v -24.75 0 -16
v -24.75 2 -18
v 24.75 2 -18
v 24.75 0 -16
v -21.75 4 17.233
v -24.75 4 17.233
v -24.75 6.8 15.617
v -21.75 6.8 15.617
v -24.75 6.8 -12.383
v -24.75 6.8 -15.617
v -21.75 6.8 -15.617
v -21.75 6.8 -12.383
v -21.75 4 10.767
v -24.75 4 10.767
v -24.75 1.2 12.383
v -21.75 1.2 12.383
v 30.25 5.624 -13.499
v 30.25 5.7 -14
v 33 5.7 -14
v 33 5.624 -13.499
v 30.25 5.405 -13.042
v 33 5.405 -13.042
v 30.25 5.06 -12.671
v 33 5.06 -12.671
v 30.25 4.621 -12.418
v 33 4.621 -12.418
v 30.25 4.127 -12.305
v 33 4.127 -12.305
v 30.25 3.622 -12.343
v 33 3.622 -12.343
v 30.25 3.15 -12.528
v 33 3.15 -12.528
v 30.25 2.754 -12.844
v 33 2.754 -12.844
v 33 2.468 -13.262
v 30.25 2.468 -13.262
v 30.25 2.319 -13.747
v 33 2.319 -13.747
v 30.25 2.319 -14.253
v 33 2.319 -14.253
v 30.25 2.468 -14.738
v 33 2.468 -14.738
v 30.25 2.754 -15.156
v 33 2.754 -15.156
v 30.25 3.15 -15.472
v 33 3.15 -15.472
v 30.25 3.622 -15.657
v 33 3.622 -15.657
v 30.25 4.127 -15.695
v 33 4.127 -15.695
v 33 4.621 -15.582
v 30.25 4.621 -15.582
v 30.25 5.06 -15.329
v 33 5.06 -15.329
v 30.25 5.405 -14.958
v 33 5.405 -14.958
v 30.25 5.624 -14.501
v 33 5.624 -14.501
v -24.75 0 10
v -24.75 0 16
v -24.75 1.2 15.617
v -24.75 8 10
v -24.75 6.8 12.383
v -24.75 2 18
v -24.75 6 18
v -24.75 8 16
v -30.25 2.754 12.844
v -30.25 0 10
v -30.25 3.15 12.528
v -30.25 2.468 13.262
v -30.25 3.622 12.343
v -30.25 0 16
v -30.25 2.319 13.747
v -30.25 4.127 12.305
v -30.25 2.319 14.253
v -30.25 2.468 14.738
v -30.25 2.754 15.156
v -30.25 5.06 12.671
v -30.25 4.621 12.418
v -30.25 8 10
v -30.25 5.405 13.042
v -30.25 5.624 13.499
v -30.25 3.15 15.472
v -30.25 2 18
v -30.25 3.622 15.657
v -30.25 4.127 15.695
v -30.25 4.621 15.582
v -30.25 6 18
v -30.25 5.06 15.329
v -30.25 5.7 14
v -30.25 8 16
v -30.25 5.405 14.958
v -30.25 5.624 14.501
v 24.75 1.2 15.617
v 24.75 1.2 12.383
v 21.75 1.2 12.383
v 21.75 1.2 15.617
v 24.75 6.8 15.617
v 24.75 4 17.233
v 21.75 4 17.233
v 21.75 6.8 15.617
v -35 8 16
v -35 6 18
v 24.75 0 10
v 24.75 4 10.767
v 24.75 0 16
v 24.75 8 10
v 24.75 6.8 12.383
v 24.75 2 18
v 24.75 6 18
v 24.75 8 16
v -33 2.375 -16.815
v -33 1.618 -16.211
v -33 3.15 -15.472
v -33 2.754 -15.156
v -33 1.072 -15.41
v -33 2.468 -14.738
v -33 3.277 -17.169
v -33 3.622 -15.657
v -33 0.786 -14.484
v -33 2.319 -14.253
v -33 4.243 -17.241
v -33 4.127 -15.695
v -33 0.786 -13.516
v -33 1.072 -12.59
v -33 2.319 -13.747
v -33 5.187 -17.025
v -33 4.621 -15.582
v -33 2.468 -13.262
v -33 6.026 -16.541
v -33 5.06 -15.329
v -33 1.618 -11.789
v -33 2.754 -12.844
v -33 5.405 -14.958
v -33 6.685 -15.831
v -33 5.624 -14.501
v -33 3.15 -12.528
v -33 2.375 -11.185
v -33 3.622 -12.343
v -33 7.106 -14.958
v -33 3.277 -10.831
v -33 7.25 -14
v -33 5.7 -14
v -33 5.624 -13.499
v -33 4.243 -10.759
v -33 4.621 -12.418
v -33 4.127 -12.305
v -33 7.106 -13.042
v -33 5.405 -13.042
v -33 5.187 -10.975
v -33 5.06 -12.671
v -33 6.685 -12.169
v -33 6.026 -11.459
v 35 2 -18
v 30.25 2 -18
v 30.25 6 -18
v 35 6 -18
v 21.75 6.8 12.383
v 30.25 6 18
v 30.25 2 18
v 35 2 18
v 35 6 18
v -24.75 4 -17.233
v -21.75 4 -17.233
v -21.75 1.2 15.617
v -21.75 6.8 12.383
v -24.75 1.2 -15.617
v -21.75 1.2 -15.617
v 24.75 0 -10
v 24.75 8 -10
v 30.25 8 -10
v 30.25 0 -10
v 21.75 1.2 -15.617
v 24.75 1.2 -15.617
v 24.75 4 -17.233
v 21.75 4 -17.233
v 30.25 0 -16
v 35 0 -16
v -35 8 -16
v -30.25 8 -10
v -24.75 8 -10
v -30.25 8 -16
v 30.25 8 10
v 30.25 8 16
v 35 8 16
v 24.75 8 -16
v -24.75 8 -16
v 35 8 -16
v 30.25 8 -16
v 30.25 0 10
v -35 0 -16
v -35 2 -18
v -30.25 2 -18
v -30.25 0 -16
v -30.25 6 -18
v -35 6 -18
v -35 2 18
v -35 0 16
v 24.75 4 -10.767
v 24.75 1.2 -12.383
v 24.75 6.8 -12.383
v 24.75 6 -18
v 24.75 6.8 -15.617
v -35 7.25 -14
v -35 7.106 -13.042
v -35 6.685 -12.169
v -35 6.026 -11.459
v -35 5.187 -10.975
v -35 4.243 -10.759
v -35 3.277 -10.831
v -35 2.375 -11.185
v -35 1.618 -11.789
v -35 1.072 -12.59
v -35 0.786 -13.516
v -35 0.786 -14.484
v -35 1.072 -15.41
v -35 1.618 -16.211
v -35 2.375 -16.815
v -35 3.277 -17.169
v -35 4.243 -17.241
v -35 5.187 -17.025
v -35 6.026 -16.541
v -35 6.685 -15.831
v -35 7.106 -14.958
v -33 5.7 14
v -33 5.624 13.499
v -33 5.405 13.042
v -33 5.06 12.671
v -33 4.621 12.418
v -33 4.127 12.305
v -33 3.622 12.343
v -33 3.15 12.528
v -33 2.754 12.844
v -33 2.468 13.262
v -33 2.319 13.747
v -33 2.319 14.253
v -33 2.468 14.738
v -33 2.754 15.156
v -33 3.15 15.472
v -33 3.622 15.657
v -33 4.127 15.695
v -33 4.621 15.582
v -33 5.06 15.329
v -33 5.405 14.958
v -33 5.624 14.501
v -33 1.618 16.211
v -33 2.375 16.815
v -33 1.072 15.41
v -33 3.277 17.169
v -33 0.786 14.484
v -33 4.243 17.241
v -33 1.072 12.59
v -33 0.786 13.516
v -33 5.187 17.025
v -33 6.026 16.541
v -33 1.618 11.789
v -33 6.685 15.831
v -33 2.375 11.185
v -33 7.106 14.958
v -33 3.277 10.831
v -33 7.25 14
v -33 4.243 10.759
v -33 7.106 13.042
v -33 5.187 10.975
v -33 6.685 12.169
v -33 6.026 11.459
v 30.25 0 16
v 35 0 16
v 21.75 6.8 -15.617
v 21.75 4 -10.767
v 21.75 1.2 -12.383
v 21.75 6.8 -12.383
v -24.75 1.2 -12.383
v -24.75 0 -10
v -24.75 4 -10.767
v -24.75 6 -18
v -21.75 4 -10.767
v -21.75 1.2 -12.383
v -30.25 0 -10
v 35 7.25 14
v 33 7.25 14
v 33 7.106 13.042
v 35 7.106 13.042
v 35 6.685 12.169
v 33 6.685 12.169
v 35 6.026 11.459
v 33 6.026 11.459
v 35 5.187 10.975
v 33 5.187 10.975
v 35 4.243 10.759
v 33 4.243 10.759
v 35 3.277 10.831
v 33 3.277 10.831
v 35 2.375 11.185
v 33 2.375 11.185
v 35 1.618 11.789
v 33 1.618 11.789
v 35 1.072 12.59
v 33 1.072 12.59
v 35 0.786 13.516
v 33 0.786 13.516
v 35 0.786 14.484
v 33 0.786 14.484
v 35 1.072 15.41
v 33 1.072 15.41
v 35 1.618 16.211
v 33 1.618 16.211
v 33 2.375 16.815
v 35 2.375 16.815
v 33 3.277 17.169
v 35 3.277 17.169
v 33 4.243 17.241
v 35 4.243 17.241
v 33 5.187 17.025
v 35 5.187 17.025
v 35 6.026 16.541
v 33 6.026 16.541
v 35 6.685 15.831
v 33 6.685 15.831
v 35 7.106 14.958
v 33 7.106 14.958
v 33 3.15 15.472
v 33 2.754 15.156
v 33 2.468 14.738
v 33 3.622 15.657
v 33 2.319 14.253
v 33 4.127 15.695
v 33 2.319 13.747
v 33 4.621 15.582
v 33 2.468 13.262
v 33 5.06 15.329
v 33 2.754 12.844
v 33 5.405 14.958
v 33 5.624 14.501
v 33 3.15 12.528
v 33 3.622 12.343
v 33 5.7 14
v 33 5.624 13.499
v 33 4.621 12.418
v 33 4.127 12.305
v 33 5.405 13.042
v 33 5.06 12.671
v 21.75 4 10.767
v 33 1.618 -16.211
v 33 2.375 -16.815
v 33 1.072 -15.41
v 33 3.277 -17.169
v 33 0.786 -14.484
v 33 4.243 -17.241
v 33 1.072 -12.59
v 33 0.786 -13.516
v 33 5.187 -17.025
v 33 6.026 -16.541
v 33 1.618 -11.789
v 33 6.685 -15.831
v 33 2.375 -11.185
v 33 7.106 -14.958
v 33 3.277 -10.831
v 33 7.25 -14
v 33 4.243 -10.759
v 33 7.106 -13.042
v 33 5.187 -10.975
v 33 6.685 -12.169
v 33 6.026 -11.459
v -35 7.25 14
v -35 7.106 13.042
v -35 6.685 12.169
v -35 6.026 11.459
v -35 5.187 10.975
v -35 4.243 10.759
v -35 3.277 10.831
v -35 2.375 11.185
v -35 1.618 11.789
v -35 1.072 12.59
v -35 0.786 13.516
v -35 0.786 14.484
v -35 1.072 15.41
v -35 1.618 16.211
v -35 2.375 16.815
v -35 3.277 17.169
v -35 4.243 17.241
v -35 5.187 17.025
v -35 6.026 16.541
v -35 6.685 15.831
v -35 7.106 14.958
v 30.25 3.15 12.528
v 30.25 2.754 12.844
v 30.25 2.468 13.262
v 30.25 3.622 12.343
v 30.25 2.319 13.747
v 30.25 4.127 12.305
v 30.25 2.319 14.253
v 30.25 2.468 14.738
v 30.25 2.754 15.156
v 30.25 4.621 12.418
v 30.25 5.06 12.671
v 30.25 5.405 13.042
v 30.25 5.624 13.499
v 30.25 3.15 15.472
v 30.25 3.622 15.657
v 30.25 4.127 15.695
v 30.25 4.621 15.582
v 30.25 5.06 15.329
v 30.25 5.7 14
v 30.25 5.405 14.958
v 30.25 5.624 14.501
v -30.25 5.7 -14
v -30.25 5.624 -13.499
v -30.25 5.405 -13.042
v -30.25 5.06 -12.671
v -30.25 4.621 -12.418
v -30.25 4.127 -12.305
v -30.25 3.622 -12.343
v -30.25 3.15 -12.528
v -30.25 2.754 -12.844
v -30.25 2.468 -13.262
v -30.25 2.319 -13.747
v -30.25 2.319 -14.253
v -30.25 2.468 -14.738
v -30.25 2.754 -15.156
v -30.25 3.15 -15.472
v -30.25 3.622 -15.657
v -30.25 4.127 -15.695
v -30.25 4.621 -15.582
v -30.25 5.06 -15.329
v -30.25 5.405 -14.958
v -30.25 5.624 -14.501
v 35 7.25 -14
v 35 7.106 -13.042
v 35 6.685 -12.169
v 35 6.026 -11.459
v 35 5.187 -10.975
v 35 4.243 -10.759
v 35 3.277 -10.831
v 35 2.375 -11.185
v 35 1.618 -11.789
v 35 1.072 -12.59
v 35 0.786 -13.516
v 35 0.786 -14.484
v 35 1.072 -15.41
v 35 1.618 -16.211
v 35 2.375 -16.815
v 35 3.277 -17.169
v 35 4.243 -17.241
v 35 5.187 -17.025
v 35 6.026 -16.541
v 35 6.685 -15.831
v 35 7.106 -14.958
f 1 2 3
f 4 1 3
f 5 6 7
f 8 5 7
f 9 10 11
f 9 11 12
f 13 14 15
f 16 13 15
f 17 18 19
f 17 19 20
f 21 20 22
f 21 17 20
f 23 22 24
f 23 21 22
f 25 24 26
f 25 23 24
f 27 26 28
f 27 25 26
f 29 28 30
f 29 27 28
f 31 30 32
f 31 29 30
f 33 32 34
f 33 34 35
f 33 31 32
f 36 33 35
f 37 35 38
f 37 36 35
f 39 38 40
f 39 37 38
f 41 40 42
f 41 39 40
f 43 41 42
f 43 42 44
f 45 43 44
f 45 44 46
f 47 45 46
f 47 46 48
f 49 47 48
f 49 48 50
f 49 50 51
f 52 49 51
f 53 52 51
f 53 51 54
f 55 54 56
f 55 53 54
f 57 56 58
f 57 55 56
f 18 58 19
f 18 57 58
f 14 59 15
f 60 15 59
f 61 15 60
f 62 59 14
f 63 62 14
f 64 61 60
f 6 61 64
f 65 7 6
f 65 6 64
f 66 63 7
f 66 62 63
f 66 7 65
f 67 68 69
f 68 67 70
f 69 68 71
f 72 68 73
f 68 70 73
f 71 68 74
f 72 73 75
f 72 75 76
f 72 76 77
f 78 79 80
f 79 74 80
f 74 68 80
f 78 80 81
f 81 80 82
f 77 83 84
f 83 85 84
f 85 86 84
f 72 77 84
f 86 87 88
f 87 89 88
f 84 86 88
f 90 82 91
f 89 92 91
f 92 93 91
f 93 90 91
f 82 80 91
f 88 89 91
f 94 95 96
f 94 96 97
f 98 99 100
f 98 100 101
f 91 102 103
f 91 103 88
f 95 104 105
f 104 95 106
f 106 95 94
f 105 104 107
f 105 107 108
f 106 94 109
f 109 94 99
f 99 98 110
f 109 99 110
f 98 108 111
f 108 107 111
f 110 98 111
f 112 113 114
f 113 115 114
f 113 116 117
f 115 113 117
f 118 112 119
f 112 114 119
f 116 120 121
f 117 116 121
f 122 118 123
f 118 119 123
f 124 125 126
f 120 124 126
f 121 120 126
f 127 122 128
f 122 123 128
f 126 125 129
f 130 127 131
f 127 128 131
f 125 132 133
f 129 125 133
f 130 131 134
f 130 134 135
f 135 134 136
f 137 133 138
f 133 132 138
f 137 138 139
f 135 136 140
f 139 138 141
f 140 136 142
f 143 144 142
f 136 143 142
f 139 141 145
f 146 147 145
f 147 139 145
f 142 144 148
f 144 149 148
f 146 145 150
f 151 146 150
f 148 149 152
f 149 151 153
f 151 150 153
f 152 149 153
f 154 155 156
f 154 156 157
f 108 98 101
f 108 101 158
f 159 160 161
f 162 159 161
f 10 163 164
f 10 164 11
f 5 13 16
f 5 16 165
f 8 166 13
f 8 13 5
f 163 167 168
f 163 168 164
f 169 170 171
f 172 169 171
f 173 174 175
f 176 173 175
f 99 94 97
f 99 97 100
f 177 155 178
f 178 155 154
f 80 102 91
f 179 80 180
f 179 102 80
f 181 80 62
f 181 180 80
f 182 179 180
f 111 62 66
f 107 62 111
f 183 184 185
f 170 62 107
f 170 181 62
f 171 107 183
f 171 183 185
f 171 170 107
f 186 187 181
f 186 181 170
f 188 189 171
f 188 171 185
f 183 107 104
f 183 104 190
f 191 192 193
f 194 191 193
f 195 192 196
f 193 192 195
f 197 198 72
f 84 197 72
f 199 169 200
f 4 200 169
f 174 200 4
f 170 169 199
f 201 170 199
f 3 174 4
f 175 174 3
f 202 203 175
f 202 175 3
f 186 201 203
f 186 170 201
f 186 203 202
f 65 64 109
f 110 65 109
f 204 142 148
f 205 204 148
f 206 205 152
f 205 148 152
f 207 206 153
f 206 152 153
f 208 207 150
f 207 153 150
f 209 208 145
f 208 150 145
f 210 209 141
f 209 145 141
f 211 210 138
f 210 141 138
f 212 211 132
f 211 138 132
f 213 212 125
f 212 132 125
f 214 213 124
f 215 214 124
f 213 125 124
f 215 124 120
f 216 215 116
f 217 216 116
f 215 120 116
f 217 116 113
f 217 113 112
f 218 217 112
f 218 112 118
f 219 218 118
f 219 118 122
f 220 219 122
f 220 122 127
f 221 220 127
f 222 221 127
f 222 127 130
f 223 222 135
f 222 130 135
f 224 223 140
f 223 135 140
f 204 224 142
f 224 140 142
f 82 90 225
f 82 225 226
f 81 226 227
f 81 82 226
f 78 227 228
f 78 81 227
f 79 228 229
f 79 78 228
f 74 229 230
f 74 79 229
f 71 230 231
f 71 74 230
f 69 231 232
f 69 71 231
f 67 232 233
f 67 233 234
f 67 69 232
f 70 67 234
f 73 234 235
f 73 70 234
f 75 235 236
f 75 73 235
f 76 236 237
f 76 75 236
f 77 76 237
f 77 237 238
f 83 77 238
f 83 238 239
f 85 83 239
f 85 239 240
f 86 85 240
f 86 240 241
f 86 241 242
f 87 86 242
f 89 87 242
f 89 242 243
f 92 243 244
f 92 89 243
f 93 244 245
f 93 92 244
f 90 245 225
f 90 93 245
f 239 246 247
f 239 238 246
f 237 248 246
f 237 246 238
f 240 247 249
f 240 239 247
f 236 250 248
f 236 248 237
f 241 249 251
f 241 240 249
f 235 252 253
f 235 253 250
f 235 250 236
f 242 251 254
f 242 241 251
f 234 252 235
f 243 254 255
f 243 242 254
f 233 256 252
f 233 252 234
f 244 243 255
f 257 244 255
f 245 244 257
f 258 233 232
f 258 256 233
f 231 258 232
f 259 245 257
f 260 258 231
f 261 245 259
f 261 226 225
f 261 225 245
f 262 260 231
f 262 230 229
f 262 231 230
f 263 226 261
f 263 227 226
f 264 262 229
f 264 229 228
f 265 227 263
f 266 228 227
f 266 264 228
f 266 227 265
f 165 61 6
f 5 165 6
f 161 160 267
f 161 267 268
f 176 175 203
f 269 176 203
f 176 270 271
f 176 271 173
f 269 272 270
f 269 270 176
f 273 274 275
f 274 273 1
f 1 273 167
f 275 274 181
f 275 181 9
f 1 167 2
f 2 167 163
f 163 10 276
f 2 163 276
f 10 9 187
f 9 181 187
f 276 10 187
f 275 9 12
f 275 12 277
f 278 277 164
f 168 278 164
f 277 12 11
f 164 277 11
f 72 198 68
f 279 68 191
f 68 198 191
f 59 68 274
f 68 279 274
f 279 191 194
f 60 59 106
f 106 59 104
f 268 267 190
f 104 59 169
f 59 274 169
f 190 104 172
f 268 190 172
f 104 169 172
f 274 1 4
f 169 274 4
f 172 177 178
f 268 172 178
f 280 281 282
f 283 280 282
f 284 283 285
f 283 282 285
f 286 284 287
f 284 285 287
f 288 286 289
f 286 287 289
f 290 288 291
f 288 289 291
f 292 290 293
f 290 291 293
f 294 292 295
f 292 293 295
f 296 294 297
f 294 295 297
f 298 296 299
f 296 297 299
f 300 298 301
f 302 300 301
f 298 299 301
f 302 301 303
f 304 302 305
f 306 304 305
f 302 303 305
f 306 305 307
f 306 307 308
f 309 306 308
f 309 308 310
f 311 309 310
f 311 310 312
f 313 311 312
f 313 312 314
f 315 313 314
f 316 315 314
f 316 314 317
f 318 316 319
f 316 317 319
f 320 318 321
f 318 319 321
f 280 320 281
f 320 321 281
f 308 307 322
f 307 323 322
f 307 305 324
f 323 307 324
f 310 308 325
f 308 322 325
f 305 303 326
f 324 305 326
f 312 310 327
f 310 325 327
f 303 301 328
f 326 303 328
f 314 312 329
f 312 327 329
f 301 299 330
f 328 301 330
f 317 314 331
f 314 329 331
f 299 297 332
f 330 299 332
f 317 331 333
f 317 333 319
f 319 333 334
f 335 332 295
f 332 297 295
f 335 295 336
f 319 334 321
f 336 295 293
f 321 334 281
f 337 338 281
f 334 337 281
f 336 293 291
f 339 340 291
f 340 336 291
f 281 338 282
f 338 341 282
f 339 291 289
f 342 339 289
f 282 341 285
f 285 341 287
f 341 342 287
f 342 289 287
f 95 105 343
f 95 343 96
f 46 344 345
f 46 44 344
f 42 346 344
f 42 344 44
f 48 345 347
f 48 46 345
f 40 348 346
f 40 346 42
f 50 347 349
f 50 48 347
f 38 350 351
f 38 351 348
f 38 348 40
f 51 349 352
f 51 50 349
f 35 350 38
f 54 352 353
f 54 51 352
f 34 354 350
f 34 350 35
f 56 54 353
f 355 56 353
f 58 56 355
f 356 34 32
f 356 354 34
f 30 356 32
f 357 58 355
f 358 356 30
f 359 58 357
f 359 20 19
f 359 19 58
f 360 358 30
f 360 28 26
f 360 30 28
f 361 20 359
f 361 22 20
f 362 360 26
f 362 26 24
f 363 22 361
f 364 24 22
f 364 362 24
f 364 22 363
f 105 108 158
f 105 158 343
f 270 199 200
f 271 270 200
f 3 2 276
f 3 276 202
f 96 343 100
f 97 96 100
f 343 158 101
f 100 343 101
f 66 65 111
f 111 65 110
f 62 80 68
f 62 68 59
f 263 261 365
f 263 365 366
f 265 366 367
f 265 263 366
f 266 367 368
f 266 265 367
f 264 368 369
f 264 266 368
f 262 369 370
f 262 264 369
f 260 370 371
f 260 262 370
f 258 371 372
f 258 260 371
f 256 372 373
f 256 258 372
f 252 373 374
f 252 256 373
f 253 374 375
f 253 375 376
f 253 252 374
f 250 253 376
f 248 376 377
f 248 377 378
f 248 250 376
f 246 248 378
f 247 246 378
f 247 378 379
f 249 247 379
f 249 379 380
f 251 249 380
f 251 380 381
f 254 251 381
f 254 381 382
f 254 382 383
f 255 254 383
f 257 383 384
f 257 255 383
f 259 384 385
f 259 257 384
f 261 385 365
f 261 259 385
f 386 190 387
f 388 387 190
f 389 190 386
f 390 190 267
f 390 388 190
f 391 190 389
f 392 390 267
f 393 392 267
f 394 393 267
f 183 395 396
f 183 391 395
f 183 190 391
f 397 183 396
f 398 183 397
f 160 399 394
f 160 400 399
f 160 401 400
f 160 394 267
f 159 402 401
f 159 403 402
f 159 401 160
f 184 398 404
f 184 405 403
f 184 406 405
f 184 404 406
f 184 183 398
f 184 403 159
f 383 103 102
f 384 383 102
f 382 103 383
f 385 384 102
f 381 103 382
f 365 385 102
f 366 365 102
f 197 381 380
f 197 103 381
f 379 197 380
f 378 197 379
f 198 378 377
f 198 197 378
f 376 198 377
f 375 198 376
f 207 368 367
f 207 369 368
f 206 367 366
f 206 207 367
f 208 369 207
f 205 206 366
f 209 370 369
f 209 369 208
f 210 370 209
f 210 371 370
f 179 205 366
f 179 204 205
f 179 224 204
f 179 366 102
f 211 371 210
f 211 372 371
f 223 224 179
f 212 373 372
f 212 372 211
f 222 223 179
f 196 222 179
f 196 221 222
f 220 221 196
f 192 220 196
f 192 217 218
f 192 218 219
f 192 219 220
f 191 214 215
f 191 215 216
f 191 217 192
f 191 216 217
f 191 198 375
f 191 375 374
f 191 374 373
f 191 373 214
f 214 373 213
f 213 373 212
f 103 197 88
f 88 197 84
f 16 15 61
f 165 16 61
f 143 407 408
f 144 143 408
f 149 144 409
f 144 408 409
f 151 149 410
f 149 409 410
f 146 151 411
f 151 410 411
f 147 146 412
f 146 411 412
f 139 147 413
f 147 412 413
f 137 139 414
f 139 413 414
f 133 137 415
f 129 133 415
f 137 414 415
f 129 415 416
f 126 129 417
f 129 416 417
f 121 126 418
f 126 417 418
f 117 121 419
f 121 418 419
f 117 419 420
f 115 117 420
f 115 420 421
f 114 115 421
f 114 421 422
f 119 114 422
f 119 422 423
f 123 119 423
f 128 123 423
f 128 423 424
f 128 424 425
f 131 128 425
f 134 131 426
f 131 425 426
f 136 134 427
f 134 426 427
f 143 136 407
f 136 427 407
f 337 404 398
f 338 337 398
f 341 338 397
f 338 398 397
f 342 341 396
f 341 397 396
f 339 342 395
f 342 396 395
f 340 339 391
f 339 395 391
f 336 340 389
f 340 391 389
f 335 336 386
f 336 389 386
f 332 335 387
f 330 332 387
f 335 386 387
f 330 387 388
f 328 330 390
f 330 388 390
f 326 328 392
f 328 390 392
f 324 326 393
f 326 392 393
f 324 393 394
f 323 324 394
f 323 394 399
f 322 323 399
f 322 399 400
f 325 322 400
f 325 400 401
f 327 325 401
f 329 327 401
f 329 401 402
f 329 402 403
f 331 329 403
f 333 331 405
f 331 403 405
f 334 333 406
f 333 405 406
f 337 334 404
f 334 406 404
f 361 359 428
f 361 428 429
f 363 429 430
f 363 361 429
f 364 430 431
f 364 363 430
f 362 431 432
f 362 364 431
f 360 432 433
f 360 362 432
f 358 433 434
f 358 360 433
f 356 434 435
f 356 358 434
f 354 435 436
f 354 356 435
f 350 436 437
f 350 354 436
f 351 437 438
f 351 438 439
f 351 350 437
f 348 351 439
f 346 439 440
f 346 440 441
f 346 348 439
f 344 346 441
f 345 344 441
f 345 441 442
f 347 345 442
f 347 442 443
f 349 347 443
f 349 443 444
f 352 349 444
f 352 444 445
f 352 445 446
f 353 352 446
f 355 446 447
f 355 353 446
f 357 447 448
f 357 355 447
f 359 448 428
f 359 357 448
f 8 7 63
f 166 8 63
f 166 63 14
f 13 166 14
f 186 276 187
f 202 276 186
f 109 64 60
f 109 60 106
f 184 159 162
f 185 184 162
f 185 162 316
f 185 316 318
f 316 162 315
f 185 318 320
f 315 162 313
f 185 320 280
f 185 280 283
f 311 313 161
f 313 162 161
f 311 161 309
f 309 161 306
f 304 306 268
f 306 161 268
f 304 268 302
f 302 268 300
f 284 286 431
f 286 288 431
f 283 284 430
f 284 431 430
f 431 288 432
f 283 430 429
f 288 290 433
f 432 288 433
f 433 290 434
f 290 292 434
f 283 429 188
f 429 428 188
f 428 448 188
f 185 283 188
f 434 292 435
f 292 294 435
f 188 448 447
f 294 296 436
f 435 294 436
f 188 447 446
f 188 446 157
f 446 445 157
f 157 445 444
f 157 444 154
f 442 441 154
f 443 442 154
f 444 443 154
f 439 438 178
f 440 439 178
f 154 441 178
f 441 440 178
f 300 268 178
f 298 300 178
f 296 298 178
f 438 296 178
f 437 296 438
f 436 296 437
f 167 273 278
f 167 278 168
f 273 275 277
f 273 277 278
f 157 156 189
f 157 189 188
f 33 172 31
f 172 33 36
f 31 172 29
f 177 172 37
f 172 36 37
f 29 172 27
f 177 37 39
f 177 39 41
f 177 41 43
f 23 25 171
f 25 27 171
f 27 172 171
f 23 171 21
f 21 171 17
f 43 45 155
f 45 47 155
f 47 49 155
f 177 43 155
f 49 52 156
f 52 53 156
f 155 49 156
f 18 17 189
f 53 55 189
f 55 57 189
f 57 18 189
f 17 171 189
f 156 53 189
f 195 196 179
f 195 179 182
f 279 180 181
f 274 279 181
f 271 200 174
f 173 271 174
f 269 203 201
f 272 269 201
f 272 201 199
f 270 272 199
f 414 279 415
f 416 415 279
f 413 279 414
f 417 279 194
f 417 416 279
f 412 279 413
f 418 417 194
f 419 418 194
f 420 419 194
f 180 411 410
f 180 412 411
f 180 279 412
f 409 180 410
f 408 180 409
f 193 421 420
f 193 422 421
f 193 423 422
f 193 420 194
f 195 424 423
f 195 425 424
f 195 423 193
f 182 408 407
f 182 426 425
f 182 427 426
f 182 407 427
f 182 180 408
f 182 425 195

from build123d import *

# Parameters (mm, degrees)
SKETCH1_W                                  = 70
SKETCH1_H                                  = 36
BOSS_EXTRUDE1_DEPTH                        = 8
SKETCH2_W                                  = 5.5
SKETCH2_H                                  = 8
CUT_EXTRUDE1_DEPTH                         = 41.162171256
CBORE_START                                = 33
CBORE_FOR_M3_CHEESE_HEAD_SCREW1_OUTLINE_R  = 3.25
CBORE_FOR_M3_CHEESE_HEAD_SCREW1_DEPTH      = 2
CBORE_START_2                              = 30.25
CBORE_FOR_M3_CHEESE_HEAD_SCREW1_2_OUTLIN_R = 1.7
CBORE_FOR_M3_CHEESE_HEAD_SCREW1_2_DEPTH    = 2.75
CUT_EXTRUDE2_DEPTH                         = 3
MIRROR2_START                              = 33
MIRROR2_COPY_1_SKETCH_R                    = 3.25
MIRROR2_COPY_1_DEPTH                       = 2
MIRROR2_START_2                            = 30.25
MIRROR2_COPY_2_SKETCH_R                    = 1.7
MIRROR2_COPY_2_DEPTH                       = 2.75
MIRROR2_COPY_3_DEPTH                       = 3
MIRROR2_COPY_4_SKETCH_R                    = 1.7
MIRROR2_COPY_4_DEPTH                       = 2.75
CHAMFER1_SIZE                              = 2


# Read off the part's stored shape, not the designer's step: CBORE for M3 Cheese Head Screw1
with BuildPart() as part:
    # Sketch1 → Boss-Extrude1 (new body)
    with BuildSketch(Plane(origin=(0, 0, 0), x_dir=(1, 0, 0), z_dir=(0, 1, 0))):
        Rectangle(SKETCH1_W, SKETCH1_H)
    extrude(amount=BOSS_EXTRUDE1_DEPTH)

    # Sketch2 → Cut-Extrude1 (cut, through all)
    with BuildSketch(Plane(origin=(0, 8, 0), x_dir=(1, 0, 0), z_dir=(0, 1, 0))):
        with Locations((-27.5, 14)):
            Rectangle(SKETCH2_W, SKETCH2_H)
        with Locations((27.5, 14)):
            Rectangle(SKETCH2_W, SKETCH2_H)
    cut_extrude1 = extrude(amount=-CUT_EXTRUDE1_DEPTH, mode=Mode.SUBTRACT)

    # CBORE for M3 Cheese Head Screw1 outline → CBORE for M3 Cheese Head Screw1 (cut)
    with BuildSketch(Plane.YZ.offset(CBORE_START)):
        with Locations((4, -14)):
            Circle(CBORE_FOR_M3_CHEESE_HEAD_SCREW1_OUTLINE_R)
    cbore_for_m3_cheese_head_screw1 = extrude(amount=CBORE_FOR_M3_CHEESE_HEAD_SCREW1_DEPTH, mode=Mode.SUBTRACT)

    # CBORE for M3 Cheese Head Screw1 2 outlin → CBORE for M3 Cheese Head Screw1 2 (cut)
    with BuildSketch(Plane.YZ.offset(CBORE_START_2)):
        with Locations((4, -14)):
            Circle(CBORE_FOR_M3_CHEESE_HEAD_SCREW1_2_OUTLIN_R)
    cbore_for_m3_cheese_head_screw1_2 = extrude(amount=CBORE_FOR_M3_CHEESE_HEAD_SCREW1_2_DEPTH, mode=Mode.SUBTRACT)

    # Sketch9 → Cut-Extrude2 (cut)
    with BuildSketch(Plane(origin=(24.75, 0, 0), x_dir=(0, 0, -1), z_dir=(1, 0, 0))):
        Polygon((15.616580754, 6.8), (12.383419246, 6.8), (10.766838493, 4), (12.383419246, 1.2), (15.616580754, 1.2), (17.233161507, 4), align=None)
    cut_extrude2 = extrude(amount=-CUT_EXTRUDE2_DEPTH, mode=Mode.SUBTRACT)

    # Mirror1: CBORE for M3 Cheese Head Screw1, CBORE for M3 Cheese Head Screw1 2, Cut-Extrude2 across plane
    add(cbore_for_m3_cheese_head_screw1.mirror(Plane(origin=(0, 0, 0), x_dir=(0, 0, 1), z_dir=(1, 0, 0))), mode=Mode.SUBTRACT)
    add(cbore_for_m3_cheese_head_screw1_2.mirror(Plane(origin=(0, 0, 0), x_dir=(0, 0, 1), z_dir=(1, 0, 0))), mode=Mode.SUBTRACT)
    add(cut_extrude2.mirror(Plane(origin=(0, 0, 0), x_dir=(0, 0, 1), z_dir=(1, 0, 0))), mode=Mode.SUBTRACT)

    # Mirror2: Cut-Extrude1, CBORE for M3 Cheese Head Screw1, CBORE for M3 Cheese Head Screw1 2, Cut-Extrude2 across plane
    add(cut_extrude1.mirror(Plane.XY), mode=Mode.SUBTRACT)
    add(cbore_for_m3_cheese_head_screw1.mirror(Plane.XY), mode=Mode.SUBTRACT)
    add(cbore_for_m3_cheese_head_screw1_2.mirror(Plane.XY), mode=Mode.SUBTRACT)
    add(cut_extrude2.mirror(Plane.XY), mode=Mode.SUBTRACT)

    # Mirror2 copy 1 sketch → Mirror2 copy 1 (cut)
    with BuildSketch(Plane(origin=(0, 0, 0), x_dir=(0, 1, 0), z_dir=(-1, 0, 0)).offset(MIRROR2_START)):
        with Locations((4, -14)):
            Circle(MIRROR2_COPY_1_SKETCH_R)
    extrude(amount=MIRROR2_COPY_1_DEPTH, mode=Mode.SUBTRACT)

    # Mirror2 copy 2 sketch → Mirror2 copy 2 (cut)
    with BuildSketch(Plane(origin=(0, 0, 0), x_dir=(0, 1, 0), z_dir=(-1, 0, 0)).offset(MIRROR2_START_2)):
        with Locations((4, -14)):
            Circle(MIRROR2_COPY_2_SKETCH_R)
    extrude(amount=MIRROR2_COPY_2_DEPTH, mode=Mode.SUBTRACT)

    # Mirror2 copy 3 sketch → Mirror2 copy 3 (cut)
    with BuildSketch(Plane.ZY.offset(24.75)):
        Polygon((15.616580754, 6.8), (12.383419246, 6.8), (10.766838493, 4), (12.383419246, 1.2), (15.616580754, 1.2), (17.233161507, 4), align=None)
    extrude(amount=-MIRROR2_COPY_3_DEPTH, mode=Mode.SUBTRACT)

    # Mirror2 copy 4 sketch → Mirror2 copy 4 (cut)
    with BuildSketch(Plane.YZ.offset(MIRROR2_START_2)):
        with Locations((4, 14)):
            Circle(MIRROR2_COPY_4_SKETCH_R)
    extrude(amount=MIRROR2_COPY_4_DEPTH, mode=Mode.SUBTRACT)

    # Chamfer1
    chamfer1_edges = [part.edges().sort_by_distance(p)[0] for p in [
        (32.625, 0, 18),
        (32.625, 8, 18),
        (-32.625, 8, 18),
        (-32.625, 0, -18),
        (-32.625, 8, -18),
        (0, 0, -18),
        (0, 8, -18),
        (-32.625, 0, 18),
        (32.625, 0, -18),
        (32.625, 8, -18),
        (0, 0, 18),
        (0, 8, 18),
    ]]
    chamfer(chamfer1_edges, length=CHAMFER1_SIZE)


solid = part.part
